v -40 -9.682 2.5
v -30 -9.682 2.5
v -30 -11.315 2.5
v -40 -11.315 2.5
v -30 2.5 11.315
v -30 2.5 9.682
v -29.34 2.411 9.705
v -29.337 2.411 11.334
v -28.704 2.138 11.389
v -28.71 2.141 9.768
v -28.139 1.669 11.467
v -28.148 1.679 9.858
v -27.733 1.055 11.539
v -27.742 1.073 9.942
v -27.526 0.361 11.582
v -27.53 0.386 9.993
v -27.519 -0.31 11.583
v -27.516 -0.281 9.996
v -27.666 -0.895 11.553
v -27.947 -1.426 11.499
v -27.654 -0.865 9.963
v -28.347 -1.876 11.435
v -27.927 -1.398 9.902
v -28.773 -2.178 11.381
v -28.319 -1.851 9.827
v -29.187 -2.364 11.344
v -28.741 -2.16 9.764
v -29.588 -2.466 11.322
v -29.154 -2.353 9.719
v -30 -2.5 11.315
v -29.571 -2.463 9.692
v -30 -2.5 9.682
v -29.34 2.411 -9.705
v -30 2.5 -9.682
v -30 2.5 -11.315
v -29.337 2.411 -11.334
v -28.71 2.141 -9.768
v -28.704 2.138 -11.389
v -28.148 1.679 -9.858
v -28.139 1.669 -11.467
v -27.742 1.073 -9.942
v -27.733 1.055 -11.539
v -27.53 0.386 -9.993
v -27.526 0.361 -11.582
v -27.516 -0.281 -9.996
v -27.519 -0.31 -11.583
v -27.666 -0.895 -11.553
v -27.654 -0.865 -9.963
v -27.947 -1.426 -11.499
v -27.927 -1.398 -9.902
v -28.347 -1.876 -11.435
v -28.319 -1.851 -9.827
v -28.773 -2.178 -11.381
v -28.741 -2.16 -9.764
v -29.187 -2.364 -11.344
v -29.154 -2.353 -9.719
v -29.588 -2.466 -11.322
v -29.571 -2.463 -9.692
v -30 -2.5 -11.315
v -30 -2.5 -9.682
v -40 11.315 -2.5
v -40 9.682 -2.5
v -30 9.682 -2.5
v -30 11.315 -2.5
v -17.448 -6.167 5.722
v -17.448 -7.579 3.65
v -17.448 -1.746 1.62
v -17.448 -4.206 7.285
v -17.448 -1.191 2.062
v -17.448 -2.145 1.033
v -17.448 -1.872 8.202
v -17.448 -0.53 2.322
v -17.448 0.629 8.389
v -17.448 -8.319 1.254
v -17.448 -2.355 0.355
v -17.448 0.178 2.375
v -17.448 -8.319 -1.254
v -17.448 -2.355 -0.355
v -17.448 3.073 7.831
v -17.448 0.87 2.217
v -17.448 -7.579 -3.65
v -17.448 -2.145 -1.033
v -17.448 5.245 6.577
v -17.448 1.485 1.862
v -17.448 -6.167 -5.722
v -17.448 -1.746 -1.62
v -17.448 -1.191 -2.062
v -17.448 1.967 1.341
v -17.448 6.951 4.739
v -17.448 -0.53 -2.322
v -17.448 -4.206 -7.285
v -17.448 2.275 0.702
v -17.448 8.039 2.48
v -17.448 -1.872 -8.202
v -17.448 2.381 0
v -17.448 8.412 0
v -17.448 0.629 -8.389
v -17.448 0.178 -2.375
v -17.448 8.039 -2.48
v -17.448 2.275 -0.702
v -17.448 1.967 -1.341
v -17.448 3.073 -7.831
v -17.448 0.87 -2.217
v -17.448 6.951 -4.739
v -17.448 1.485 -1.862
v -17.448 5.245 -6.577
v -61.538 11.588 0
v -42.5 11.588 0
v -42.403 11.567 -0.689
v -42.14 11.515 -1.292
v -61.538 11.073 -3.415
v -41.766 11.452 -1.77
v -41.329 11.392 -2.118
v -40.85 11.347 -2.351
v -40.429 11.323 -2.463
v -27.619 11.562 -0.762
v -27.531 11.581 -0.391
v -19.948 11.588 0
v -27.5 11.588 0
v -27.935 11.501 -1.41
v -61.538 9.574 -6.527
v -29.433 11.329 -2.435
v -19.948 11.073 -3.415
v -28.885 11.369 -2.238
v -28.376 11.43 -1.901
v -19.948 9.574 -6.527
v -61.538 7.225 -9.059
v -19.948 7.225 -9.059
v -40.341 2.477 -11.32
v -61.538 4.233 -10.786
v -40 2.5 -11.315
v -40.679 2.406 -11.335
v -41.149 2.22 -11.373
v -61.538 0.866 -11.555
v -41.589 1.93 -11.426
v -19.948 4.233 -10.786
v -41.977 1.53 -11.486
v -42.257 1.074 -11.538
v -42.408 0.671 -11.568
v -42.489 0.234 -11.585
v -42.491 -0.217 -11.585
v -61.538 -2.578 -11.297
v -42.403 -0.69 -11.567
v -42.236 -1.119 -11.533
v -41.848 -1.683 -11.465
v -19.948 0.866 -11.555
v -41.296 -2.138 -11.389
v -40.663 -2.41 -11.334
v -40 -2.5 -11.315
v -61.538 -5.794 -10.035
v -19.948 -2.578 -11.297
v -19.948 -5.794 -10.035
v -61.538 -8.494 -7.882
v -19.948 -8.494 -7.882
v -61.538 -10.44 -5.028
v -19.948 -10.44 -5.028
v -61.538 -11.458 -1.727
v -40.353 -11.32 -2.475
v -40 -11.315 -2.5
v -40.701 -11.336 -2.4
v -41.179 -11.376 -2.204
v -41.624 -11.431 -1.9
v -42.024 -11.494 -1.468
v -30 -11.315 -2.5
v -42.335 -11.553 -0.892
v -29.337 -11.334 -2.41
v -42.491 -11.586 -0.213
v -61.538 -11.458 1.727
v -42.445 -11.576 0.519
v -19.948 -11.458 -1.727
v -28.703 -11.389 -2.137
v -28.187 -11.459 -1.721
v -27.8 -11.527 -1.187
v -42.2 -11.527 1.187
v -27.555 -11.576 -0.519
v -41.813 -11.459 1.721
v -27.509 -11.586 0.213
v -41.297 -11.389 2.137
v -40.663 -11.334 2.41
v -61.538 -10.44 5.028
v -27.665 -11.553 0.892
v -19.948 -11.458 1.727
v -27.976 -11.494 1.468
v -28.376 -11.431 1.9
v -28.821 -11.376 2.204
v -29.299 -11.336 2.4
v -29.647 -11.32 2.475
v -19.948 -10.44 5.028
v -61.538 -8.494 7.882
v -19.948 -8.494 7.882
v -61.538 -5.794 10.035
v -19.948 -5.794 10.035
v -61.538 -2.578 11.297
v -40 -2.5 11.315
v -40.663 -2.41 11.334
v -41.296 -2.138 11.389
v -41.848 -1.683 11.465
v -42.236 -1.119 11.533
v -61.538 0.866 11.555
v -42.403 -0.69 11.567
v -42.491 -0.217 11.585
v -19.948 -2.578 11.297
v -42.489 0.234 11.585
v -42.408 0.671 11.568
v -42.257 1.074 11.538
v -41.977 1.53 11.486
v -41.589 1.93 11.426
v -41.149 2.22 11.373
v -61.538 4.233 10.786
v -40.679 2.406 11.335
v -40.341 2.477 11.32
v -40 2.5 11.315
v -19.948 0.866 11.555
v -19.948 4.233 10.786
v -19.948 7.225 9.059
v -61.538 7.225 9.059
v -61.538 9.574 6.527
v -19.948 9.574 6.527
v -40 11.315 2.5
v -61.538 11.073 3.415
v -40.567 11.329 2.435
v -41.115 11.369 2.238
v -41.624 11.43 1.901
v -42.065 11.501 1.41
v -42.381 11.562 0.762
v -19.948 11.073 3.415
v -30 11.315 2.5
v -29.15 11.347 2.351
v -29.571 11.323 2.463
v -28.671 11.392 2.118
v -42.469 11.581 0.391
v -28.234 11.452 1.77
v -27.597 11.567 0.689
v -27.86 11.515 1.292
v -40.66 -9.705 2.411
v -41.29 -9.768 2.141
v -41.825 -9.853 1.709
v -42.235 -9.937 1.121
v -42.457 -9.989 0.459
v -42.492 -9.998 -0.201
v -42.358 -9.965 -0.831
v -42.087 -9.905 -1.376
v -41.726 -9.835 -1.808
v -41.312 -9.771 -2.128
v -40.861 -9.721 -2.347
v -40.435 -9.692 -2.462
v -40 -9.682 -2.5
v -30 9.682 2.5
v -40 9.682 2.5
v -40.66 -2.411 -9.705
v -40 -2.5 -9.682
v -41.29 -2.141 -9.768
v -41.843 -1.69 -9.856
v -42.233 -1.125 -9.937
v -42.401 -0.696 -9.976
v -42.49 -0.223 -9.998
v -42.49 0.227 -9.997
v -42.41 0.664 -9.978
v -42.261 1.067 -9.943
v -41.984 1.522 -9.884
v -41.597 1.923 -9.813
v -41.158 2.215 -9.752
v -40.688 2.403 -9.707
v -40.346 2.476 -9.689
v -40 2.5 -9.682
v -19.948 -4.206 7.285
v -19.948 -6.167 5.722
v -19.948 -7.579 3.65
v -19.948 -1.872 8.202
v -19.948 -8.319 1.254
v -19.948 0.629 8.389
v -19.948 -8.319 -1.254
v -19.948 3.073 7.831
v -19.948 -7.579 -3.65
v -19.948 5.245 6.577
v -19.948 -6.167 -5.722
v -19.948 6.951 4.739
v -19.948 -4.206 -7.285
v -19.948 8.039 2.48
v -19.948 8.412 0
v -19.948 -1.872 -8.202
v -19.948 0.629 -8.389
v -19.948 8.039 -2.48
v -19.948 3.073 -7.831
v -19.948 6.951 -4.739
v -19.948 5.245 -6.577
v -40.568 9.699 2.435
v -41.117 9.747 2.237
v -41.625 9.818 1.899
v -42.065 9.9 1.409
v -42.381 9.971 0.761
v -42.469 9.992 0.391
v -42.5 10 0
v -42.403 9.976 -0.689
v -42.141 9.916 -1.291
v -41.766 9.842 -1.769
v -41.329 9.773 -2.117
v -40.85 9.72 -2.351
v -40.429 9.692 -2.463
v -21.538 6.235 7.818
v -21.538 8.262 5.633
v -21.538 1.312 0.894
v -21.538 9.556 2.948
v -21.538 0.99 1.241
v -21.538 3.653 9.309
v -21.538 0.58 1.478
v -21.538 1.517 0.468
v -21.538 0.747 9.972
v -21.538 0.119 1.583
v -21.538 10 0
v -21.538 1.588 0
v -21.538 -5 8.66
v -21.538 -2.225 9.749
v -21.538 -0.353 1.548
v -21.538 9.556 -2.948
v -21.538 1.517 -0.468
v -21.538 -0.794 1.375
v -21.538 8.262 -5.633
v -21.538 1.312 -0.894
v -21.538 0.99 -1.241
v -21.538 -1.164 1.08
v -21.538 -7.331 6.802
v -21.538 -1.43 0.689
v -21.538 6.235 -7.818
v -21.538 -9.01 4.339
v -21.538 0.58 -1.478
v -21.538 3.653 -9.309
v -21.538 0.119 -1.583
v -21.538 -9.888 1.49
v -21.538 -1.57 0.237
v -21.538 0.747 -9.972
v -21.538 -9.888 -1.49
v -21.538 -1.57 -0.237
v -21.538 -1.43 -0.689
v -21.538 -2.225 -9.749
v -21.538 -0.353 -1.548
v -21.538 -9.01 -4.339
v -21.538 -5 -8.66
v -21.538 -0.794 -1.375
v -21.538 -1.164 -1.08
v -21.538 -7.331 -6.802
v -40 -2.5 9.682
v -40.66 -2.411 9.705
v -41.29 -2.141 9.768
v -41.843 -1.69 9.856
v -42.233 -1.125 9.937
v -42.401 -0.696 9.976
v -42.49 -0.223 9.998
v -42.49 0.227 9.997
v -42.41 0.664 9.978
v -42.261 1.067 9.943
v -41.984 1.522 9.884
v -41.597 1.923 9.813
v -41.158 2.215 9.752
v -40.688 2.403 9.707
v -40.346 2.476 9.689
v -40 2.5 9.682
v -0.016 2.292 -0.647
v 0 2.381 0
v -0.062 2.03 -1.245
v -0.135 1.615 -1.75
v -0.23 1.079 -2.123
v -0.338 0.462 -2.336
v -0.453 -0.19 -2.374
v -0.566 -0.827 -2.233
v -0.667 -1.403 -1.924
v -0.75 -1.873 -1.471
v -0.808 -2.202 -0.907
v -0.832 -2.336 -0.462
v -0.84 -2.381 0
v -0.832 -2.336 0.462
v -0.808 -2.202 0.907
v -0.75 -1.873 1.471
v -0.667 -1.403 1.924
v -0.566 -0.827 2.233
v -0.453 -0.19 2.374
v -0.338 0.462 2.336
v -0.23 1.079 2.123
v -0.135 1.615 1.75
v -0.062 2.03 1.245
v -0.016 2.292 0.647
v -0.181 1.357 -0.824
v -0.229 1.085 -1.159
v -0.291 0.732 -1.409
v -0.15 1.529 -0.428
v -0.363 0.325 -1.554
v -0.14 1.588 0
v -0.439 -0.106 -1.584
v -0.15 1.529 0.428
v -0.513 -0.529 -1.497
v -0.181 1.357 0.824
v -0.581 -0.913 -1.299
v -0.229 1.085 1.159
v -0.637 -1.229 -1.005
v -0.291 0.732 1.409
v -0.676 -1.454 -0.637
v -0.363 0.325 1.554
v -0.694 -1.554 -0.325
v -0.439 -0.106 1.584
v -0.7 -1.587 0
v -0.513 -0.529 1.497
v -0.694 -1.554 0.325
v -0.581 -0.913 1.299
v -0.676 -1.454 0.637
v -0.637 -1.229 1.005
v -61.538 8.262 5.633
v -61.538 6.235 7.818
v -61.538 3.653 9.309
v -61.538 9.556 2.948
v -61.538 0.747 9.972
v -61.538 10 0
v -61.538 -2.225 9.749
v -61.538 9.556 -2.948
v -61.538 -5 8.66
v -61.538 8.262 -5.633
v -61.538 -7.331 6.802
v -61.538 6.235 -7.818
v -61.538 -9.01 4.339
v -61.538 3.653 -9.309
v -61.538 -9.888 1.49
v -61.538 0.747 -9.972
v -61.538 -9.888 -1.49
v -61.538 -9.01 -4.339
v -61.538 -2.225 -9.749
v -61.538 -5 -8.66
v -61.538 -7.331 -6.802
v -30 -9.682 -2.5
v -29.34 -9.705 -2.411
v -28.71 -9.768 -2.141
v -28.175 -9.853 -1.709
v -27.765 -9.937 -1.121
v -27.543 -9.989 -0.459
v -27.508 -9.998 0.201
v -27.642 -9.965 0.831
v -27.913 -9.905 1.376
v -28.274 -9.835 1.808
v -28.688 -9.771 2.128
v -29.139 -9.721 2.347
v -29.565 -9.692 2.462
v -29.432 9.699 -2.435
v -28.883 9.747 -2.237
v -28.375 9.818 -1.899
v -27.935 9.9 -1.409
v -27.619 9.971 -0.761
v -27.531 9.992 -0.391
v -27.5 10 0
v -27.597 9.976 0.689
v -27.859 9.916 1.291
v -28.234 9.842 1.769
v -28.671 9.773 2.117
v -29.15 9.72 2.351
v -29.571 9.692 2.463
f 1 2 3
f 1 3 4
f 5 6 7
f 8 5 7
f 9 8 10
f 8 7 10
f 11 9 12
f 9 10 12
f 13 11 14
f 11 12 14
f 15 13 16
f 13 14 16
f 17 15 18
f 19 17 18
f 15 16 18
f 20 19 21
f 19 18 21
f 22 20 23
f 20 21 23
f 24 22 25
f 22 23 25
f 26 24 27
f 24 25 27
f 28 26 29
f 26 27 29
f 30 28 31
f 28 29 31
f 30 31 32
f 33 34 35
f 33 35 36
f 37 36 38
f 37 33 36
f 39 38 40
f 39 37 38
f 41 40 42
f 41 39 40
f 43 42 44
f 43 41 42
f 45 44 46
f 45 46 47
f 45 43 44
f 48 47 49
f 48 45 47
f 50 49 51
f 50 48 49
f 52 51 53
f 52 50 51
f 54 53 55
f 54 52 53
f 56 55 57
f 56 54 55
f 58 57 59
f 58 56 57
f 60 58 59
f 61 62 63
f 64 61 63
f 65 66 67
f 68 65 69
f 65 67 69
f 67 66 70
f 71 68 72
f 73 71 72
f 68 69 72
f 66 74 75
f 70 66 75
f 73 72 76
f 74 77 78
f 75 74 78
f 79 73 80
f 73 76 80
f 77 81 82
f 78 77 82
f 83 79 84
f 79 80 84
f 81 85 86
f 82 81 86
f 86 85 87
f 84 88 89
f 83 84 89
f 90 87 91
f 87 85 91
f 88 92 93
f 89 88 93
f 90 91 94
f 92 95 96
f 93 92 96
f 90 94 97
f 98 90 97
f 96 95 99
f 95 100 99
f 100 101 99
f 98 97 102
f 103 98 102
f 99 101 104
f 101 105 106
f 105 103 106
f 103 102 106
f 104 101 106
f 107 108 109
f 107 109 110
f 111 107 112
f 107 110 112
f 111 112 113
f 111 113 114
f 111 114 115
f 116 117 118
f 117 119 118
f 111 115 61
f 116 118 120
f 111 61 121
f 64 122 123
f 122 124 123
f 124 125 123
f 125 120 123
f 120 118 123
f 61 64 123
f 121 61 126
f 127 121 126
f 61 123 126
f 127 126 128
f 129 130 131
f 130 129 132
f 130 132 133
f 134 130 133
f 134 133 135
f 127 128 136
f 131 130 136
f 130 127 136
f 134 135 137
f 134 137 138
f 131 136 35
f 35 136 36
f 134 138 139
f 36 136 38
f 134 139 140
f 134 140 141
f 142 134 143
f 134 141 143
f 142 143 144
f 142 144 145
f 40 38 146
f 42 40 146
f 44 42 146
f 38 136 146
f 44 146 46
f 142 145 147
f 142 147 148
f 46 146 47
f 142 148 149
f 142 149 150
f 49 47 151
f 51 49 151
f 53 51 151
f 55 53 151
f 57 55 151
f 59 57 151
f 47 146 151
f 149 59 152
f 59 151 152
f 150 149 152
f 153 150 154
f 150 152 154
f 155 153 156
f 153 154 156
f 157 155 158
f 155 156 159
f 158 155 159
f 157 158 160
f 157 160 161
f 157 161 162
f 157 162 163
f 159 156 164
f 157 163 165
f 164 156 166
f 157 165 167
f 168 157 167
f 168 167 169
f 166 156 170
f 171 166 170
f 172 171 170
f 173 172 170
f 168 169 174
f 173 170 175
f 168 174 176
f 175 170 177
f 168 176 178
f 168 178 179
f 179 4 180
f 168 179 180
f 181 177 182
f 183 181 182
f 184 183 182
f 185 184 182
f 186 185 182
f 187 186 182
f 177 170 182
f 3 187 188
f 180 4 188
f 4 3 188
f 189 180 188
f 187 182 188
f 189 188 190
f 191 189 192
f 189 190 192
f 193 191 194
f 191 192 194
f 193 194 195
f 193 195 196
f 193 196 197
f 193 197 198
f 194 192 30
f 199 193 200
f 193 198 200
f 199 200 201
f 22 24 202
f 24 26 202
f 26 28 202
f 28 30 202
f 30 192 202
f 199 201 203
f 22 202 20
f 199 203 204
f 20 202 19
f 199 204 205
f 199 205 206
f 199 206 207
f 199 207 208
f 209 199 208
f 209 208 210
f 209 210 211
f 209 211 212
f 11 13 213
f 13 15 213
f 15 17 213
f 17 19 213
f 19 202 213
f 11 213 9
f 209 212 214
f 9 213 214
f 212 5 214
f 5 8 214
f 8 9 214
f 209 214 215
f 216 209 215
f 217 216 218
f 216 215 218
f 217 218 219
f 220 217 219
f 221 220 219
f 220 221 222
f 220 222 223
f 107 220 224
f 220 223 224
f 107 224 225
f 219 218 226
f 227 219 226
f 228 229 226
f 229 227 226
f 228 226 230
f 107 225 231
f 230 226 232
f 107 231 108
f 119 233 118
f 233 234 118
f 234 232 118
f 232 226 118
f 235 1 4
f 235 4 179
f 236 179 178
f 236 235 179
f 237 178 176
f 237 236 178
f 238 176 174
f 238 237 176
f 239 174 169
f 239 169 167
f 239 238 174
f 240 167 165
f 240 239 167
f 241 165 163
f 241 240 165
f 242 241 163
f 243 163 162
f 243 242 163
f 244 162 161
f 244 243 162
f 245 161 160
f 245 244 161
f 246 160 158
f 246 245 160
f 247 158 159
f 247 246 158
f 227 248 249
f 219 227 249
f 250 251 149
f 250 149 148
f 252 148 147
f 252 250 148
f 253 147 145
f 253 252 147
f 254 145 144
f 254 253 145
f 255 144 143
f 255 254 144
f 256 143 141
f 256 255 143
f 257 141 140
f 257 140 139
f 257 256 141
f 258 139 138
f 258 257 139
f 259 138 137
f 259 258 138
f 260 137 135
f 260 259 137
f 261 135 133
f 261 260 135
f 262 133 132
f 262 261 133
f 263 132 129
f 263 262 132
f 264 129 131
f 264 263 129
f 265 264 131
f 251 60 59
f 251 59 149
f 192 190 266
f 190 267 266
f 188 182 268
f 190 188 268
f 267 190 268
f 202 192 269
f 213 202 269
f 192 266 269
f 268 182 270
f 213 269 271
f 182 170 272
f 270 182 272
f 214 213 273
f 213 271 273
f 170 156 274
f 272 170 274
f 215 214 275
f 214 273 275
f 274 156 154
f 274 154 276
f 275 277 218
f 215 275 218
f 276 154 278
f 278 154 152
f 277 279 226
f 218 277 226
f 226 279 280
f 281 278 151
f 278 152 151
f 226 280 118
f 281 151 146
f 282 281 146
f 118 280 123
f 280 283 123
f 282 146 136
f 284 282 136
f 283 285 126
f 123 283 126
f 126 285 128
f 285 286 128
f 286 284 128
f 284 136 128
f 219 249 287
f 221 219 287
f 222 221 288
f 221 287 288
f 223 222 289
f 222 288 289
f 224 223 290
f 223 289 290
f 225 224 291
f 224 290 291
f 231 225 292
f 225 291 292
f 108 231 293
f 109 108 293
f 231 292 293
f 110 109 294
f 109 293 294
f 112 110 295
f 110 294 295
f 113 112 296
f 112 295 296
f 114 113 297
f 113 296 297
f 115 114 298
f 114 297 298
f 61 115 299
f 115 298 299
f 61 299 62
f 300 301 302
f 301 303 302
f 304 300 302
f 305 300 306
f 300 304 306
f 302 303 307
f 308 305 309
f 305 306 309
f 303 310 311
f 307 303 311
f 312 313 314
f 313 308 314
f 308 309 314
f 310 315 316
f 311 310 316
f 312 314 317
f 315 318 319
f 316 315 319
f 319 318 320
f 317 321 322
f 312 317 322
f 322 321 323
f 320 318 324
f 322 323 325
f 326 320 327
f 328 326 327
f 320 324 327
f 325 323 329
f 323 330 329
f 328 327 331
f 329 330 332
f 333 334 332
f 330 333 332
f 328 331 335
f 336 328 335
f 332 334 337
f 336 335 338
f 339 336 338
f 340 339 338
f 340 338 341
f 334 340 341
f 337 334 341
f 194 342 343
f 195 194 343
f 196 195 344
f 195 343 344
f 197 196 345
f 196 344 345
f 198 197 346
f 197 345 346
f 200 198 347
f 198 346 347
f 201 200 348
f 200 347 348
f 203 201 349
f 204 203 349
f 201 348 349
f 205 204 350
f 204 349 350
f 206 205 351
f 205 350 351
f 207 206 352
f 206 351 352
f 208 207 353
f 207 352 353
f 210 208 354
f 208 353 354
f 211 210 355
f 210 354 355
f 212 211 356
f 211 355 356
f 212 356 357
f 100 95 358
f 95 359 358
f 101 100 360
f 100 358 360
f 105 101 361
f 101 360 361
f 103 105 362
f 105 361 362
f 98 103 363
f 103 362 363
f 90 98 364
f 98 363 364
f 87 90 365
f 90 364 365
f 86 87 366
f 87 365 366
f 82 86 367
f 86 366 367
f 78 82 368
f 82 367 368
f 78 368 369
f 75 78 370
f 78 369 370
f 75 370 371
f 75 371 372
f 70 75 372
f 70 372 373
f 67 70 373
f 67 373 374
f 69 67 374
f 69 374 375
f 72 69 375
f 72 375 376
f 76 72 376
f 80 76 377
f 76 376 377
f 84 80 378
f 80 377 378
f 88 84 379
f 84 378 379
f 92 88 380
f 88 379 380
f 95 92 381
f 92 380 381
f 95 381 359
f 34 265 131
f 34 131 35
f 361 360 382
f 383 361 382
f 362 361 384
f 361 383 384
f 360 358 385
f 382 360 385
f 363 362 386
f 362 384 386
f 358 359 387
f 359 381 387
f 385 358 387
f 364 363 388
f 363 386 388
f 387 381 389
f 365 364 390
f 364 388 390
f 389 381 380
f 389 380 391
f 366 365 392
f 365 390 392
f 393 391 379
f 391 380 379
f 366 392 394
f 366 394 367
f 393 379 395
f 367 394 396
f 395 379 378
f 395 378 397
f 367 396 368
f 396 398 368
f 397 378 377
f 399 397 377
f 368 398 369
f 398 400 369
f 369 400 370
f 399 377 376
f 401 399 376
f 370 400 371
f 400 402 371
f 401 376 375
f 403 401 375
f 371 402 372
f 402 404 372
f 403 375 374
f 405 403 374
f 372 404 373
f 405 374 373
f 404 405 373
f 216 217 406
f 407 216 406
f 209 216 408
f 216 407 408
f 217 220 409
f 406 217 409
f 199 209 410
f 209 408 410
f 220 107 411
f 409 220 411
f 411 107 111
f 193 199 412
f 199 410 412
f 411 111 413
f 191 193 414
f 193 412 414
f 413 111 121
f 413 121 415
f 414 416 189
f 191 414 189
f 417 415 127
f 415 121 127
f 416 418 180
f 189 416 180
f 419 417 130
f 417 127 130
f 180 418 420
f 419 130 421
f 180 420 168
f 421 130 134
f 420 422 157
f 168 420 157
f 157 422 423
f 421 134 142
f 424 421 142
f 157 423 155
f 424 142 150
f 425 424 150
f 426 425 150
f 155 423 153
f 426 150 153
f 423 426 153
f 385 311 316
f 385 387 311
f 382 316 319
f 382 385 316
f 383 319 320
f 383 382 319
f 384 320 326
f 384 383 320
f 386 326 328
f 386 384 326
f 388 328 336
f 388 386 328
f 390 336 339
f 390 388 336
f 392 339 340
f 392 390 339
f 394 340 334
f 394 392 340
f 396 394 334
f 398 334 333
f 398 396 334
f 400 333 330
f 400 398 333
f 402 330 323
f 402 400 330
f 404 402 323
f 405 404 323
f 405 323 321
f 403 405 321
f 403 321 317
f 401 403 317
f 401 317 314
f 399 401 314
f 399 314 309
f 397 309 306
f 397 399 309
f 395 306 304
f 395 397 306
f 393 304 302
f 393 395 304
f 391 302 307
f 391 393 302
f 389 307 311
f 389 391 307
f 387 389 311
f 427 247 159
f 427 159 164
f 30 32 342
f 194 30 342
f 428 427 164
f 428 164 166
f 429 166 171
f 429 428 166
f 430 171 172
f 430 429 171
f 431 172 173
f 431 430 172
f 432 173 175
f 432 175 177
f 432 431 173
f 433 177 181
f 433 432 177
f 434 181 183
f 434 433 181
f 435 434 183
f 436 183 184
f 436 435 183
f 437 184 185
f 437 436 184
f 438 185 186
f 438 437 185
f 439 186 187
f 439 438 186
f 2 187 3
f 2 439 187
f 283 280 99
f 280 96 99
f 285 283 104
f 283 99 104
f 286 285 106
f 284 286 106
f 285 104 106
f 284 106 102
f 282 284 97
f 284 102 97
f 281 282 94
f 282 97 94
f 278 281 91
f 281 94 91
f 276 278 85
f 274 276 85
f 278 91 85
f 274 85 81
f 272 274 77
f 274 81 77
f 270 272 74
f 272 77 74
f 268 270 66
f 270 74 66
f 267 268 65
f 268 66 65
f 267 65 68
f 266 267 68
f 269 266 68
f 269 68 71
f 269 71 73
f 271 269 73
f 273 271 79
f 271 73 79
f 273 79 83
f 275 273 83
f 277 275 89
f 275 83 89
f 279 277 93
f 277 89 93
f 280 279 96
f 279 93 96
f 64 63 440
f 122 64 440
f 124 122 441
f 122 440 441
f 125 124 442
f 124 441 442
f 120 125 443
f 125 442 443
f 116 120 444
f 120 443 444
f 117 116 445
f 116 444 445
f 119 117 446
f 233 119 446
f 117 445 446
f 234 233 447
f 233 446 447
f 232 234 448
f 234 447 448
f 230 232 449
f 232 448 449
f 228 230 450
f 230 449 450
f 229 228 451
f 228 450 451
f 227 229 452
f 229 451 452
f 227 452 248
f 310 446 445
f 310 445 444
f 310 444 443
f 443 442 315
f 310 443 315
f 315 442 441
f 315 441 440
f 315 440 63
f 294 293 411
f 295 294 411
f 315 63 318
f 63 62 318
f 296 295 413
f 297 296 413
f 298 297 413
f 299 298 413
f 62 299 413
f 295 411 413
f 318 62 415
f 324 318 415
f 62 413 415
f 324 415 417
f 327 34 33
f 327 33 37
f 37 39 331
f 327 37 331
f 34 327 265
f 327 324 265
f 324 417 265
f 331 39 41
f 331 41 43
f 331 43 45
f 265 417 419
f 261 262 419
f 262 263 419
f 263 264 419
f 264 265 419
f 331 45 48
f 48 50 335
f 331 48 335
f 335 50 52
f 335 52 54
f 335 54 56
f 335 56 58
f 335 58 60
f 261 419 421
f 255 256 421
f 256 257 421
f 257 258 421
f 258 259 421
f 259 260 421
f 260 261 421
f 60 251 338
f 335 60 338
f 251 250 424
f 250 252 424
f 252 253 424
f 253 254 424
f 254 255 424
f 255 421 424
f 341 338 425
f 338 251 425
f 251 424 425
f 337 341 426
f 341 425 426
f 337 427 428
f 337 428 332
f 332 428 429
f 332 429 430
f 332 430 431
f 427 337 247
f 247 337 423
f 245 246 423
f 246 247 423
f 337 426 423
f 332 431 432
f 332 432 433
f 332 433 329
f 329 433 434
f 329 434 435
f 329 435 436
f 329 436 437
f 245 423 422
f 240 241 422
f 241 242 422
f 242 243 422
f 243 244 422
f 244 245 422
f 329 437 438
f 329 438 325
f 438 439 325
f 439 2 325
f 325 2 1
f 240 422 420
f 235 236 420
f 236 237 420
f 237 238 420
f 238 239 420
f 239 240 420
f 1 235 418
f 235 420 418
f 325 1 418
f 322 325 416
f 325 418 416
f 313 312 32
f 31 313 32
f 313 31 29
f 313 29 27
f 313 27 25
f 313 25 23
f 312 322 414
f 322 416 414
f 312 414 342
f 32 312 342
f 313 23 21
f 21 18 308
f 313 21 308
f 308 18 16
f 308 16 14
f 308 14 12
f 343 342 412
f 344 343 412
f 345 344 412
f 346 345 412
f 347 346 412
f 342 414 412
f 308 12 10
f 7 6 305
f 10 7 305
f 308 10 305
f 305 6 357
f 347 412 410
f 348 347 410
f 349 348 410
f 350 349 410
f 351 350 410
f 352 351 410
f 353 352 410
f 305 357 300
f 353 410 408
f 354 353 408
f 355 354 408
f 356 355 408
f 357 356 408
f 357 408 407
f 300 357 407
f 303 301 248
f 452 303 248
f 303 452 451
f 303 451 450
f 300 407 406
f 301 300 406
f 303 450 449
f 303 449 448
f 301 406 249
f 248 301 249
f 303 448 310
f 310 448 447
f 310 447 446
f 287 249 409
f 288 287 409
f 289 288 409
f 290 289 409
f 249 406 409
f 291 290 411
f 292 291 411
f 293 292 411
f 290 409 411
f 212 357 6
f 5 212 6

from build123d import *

# Parameters (mm, degrees)
CORTAR_EXTRUIR1_DEPTH      = 12.5875
CORTAR_EXTRUIR1_DEPTH_BACK = 12.5875
CORTAR_EXTRUIR2_DEPTH      = 12.5875001
CORTAR_EXTRUIR2_DEPTH_BACK = 12.5875001
CORTAR_EXTRUIR3_DEPTH      = 12.5875001
CORTAR_EXTRUIR3_DEPTH_BACK = 12.5875001


with BuildPart() as part:
    # Croquis1 → Revolución1 (revolve)
    with BuildSketch(Plane.XY):
        Polygon((-61.538063792, 11.5875), (-19.948063792, 11.5875), (-19.948063792, 8.4125), (-17.448063792, 8.4125), (-17.448063792, 2.38125), (0, 2.38125), (0, 1.5875), (-17.448063792, 1.5875), (-21.538063792, 1.5875), (-21.538063792, 10), (-61.538063792, 10), align=None)
    revolve(axis=Axis((0, 0, 0), (-1, 0, 0)))

    # Croquis2 → Cortar-Extruir1 (cut, two sides)
    with BuildSketch(Plane.XY) as cortar_extruir1_sk:
        with BuildLine():
            Line((-40, 2.5), (-30, 2.5))
            ThreePointArc((-30, 2.5), (-27.5, 0), (-30, -2.5))
            Line((-30, -2.5), (-40, -2.5))
            ThreePointArc((-40, -2.5), (-42.5, 0), (-40, 2.5))
        make_face()
    extrude(amount=CORTAR_EXTRUIR1_DEPTH, mode=Mode.SUBTRACT)
    extrude(cortar_extruir1_sk.sketch, amount=-CORTAR_EXTRUIR1_DEPTH_BACK, mode=Mode.SUBTRACT)

    # Croquis3 → Cortar-Extruir2 (cut, two sides)
    with BuildSketch(Plane(origin=(0, 0, 0), x_dir=(1, 0, 0), z_dir=(0, 1, 0))) as cortar_extruir2_sk:
        with BuildLine():
            Line((-40, 2.5), (-30, 2.5))
            ThreePointArc((-30, 2.5), (-27.5, 0), (-30, -2.5))
            Line((-30, -2.5), (-40, -2.5))
            ThreePointArc((-40, -2.5), (-42.5, 0), (-40, 2.5))
        make_face()
    extrude(amount=CORTAR_EXTRUIR2_DEPTH, mode=Mode.SUBTRACT)
    extrude(cortar_extruir2_sk.sketch, amount=-CORTAR_EXTRUIR2_DEPTH_BACK, mode=Mode.SUBTRACT)

    # Croquis4 → Cortar-Extruir3 (cut, two sides)
    with BuildSketch(Plane.XY) as cortar_extruir3_sk:
        Polygon((0, 2.38125), (-0.839757246, -2.38125), (0, -2.38125), align=None)
    extrude(amount=CORTAR_EXTRUIR3_DEPTH, mode=Mode.SUBTRACT)
    extrude(cortar_extruir3_sk.sketch, amount=-CORTAR_EXTRUIR3_DEPTH_BACK, mode=Mode.SUBTRACT)


solid = part.part
